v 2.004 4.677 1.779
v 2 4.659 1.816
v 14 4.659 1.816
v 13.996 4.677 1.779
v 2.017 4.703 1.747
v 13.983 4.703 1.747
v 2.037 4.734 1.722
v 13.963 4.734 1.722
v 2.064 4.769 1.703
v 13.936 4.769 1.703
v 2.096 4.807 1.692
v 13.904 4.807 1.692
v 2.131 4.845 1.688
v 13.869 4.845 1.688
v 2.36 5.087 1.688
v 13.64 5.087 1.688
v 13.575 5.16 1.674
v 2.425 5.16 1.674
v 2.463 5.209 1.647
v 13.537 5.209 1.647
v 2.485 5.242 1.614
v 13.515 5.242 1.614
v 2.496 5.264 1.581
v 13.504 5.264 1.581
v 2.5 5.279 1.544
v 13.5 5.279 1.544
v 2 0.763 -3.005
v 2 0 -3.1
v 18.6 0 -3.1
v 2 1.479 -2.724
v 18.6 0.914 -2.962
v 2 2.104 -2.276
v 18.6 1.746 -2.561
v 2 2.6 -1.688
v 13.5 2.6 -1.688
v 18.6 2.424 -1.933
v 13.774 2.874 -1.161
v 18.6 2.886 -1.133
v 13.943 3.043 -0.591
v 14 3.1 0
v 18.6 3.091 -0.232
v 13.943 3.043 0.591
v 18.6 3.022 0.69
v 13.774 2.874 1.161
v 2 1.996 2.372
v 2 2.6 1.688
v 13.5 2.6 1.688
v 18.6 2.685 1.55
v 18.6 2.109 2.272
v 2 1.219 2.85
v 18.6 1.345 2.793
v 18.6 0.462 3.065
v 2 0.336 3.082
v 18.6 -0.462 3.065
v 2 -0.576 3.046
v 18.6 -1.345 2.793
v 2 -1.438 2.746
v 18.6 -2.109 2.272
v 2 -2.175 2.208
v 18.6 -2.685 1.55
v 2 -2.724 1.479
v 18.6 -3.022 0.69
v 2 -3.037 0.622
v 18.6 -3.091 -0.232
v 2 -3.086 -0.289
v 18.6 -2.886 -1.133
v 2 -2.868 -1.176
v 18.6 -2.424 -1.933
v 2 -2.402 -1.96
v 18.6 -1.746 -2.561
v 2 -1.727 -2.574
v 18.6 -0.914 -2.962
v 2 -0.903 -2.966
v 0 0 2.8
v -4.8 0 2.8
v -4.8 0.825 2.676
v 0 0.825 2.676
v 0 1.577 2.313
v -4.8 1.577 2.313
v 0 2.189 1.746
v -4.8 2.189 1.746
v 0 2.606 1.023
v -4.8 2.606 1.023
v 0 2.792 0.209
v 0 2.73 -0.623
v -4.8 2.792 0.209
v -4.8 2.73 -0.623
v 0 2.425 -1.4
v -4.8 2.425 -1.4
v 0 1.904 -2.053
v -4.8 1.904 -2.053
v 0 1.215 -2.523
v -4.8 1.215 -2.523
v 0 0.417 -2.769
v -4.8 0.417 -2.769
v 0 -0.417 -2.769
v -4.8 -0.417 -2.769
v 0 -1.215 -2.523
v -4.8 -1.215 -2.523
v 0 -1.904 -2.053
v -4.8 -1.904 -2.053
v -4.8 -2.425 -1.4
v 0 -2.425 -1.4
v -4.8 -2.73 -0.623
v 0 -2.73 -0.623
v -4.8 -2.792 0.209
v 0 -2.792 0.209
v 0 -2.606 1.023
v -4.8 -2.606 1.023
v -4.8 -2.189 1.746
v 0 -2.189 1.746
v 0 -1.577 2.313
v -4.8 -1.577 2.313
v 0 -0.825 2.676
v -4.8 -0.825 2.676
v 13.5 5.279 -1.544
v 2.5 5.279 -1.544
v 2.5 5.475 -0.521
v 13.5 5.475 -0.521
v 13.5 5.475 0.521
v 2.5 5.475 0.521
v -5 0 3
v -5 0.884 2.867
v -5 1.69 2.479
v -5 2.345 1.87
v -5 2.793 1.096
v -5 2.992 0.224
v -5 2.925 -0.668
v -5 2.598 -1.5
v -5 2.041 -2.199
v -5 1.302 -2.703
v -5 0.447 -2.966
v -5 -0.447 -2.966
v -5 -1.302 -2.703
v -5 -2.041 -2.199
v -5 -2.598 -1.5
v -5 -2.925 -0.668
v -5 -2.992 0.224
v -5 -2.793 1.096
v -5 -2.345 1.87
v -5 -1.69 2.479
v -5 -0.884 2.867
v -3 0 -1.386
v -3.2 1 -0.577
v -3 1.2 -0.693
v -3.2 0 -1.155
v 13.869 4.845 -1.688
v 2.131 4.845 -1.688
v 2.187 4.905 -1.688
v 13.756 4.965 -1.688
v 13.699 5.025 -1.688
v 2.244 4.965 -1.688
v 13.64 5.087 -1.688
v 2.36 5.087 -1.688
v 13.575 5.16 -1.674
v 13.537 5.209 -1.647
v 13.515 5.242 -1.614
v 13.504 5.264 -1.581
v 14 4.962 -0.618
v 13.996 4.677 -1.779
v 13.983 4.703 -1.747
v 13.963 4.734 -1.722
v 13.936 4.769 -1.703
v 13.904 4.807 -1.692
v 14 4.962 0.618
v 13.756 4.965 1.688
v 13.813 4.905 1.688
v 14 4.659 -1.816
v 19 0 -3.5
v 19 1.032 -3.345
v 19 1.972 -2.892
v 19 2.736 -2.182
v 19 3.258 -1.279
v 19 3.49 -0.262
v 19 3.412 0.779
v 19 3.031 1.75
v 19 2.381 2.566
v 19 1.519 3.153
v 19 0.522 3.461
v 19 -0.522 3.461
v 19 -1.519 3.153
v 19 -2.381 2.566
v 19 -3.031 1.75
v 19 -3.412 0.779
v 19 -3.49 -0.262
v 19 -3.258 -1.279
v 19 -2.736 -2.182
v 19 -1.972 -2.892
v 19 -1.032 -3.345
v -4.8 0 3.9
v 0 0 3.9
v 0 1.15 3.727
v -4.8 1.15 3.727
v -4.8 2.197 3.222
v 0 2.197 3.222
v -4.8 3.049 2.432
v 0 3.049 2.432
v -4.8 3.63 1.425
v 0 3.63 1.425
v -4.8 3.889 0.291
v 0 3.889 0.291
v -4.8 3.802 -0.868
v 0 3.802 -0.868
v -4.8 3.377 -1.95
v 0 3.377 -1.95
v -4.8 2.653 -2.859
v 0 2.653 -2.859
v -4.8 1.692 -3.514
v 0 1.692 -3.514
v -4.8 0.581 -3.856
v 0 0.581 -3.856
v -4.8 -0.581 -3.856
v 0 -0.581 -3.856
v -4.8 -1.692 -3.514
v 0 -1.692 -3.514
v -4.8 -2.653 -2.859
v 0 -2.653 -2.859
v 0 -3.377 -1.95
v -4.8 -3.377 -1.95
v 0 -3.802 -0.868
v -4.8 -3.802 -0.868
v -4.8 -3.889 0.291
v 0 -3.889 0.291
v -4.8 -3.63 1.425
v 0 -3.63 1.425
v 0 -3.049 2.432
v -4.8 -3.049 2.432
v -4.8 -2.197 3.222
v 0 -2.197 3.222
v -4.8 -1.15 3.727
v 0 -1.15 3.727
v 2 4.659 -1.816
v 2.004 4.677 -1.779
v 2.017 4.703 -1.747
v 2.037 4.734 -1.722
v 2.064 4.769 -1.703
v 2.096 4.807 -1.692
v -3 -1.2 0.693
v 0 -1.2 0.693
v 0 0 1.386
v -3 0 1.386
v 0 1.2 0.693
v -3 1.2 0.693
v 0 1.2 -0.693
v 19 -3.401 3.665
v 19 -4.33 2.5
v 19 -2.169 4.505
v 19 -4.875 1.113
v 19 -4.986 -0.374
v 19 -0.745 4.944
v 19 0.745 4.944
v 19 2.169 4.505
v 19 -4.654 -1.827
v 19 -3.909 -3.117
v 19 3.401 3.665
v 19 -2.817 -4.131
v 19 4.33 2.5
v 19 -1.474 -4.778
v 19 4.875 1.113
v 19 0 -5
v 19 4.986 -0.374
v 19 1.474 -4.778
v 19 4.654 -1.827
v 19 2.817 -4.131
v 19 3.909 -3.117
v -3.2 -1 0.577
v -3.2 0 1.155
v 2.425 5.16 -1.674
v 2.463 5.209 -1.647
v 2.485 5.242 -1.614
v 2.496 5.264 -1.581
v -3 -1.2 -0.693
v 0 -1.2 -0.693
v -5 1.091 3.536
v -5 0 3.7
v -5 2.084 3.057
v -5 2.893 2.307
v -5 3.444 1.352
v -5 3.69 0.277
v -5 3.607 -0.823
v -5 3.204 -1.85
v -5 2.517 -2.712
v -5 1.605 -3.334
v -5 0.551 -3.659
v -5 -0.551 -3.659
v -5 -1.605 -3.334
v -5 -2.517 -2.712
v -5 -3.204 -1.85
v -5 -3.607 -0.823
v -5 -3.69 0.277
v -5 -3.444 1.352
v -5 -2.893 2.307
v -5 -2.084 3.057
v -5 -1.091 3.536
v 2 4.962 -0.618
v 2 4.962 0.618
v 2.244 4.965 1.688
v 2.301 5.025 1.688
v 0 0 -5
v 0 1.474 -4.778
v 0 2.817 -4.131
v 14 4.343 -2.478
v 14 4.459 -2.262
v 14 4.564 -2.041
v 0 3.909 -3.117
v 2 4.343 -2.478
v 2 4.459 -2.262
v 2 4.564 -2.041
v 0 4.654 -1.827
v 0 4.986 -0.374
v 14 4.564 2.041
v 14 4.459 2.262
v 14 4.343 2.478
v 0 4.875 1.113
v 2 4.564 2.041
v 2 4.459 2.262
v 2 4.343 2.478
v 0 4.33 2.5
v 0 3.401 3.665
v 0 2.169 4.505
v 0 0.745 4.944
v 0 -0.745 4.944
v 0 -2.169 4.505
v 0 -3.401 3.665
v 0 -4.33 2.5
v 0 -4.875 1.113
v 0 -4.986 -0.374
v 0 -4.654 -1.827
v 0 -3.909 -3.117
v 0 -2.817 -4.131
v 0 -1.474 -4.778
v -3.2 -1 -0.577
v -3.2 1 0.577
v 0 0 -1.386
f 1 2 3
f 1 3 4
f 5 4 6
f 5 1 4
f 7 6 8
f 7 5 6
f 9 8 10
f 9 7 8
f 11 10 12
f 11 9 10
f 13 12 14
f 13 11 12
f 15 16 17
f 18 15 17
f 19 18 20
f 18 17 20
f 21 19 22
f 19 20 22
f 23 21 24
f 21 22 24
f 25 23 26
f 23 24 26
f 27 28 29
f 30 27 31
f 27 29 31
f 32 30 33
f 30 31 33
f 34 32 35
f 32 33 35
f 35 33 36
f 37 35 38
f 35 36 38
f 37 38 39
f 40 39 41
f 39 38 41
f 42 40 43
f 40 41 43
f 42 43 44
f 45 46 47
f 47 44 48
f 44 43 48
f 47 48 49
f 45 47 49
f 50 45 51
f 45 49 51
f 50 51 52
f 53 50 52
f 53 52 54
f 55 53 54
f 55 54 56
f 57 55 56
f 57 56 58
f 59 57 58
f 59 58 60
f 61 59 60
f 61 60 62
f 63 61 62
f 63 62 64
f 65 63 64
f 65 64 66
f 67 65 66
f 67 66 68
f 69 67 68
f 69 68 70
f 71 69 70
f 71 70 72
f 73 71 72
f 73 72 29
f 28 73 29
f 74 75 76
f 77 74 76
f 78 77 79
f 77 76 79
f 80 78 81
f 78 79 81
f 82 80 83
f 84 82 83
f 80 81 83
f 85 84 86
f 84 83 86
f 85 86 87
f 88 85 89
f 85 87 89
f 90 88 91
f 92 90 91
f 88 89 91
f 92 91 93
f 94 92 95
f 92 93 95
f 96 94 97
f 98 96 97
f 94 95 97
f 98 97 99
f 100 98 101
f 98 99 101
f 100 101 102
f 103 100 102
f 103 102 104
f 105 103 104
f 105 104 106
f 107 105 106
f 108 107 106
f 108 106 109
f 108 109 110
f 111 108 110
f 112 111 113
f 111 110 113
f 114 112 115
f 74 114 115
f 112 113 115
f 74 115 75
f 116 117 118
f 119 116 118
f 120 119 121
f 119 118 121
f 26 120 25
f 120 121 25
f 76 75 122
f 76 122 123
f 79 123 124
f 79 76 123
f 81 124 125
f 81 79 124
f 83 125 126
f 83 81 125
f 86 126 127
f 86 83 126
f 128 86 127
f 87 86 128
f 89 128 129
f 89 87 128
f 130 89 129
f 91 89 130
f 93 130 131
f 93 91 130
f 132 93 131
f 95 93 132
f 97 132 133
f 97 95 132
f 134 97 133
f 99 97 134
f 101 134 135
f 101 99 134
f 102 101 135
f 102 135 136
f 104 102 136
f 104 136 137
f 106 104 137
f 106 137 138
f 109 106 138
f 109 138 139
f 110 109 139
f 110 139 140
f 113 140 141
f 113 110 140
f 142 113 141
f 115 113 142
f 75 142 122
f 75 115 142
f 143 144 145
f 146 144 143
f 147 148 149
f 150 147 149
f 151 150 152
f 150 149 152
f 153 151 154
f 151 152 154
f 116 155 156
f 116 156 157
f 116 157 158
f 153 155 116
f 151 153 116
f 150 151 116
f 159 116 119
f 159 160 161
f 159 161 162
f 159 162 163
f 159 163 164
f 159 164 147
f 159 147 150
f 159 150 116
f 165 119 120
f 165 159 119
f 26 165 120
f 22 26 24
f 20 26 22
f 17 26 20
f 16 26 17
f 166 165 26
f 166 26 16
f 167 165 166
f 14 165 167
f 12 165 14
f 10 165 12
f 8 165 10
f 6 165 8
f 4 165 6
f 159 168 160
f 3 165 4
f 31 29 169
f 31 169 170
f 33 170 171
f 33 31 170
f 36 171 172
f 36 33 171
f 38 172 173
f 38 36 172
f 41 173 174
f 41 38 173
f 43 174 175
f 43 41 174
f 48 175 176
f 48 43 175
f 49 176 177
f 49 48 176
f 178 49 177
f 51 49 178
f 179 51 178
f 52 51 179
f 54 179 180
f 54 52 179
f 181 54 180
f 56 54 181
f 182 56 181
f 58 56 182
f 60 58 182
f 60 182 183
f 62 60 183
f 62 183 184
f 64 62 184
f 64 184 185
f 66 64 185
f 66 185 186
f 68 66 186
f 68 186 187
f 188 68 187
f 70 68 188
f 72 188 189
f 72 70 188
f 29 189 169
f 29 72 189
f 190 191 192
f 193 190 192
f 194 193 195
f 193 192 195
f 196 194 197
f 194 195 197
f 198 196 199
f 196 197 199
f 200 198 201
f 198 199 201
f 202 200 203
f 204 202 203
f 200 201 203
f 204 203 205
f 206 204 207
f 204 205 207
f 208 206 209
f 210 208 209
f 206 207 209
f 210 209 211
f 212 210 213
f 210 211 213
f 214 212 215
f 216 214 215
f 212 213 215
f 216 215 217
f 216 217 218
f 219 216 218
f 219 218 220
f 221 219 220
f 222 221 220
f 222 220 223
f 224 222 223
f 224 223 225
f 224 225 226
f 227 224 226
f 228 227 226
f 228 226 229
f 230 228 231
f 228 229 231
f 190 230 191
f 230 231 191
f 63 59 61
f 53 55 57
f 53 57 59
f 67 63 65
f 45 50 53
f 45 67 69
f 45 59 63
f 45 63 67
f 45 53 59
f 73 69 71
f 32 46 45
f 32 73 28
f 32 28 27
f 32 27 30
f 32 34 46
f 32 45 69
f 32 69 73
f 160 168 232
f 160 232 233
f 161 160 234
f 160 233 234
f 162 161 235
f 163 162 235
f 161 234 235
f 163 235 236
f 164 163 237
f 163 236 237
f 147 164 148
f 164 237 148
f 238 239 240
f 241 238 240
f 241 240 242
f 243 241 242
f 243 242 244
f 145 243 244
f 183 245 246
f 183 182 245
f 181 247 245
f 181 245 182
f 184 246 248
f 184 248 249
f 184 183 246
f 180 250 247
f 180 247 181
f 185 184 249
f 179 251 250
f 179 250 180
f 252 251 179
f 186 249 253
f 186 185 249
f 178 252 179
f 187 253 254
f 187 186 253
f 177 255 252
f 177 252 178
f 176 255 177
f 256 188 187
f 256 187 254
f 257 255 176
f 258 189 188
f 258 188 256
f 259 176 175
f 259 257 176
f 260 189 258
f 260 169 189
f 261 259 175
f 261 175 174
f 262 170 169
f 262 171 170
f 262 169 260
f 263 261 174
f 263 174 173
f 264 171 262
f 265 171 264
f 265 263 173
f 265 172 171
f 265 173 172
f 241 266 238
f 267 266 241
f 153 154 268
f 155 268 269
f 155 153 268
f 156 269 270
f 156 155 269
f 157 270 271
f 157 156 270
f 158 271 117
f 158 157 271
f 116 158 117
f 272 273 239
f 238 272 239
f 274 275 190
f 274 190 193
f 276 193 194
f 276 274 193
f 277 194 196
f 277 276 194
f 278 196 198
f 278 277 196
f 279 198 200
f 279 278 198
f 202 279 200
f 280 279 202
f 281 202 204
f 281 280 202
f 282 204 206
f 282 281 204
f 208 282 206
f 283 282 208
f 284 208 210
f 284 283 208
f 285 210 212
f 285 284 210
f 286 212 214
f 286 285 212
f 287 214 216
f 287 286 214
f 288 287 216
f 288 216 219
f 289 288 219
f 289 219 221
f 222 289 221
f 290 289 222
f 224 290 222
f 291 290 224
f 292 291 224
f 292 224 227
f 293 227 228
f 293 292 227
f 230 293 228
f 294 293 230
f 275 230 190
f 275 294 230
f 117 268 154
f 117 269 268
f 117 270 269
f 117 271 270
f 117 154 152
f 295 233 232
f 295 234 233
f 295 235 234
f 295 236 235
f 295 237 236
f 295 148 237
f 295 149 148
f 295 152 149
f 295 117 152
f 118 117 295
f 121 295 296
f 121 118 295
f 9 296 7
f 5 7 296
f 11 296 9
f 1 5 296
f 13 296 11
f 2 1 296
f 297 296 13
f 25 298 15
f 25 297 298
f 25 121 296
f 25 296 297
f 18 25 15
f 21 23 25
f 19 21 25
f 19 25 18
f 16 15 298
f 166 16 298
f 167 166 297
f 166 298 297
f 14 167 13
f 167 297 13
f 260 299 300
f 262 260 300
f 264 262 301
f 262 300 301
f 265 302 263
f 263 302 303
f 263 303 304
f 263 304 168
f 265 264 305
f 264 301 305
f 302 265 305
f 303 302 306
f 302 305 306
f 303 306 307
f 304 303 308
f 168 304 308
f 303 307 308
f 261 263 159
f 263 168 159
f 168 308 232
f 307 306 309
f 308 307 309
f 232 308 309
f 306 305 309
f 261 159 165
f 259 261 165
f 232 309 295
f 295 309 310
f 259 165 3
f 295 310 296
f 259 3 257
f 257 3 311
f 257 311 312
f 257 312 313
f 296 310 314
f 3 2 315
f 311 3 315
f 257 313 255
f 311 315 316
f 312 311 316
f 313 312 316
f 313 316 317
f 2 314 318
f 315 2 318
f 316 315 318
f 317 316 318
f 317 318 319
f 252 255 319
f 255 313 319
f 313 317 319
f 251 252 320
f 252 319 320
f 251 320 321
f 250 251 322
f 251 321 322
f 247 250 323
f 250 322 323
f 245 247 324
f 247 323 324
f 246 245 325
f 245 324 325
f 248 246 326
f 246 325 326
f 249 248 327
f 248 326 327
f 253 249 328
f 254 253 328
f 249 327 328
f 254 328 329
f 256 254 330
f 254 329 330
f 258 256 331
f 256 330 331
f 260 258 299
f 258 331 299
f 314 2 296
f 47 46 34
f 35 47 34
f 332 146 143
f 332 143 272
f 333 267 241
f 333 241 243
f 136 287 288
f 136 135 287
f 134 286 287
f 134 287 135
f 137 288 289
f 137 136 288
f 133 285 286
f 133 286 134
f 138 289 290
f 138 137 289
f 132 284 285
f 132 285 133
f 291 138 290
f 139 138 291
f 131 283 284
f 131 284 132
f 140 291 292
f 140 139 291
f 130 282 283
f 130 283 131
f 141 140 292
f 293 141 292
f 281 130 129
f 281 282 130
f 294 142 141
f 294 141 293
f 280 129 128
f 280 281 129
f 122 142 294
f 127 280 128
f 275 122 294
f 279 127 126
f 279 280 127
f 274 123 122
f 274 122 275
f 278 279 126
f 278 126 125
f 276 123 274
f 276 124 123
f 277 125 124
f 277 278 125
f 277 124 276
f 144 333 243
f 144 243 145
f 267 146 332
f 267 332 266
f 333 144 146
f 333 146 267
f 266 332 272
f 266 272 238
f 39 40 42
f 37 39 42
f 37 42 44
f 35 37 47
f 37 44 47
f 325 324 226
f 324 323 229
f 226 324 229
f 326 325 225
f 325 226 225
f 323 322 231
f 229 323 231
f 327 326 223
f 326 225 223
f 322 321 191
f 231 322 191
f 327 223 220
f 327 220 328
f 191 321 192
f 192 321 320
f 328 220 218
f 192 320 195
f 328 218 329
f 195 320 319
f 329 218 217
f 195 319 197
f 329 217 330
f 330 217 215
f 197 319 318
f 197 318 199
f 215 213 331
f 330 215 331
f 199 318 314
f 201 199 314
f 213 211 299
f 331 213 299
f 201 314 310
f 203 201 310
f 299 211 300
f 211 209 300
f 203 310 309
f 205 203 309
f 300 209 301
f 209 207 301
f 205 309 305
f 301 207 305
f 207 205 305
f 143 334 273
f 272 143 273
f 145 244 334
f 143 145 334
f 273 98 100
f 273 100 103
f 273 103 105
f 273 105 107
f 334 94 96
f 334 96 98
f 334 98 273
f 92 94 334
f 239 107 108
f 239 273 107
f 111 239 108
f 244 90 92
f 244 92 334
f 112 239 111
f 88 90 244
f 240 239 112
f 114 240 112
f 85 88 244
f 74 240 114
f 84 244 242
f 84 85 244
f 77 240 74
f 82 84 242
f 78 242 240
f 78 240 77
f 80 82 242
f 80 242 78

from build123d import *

# Parameters (mm, degrees)
SKETCH_1_R          = 5
EXTRUDE_1_DEPTH     = 19
SKETCH_3_R          = 3.1
CUT_EXTRUDE_1_DEPTH = 17
EXTRUDE_2_DEPTH     = 12
SKETCH_8_R          = 3.9
EXTRUDE_4_DEPTH     = 5
SKETCH_9_R          = 2.8
CUT_EXTRUDE_2_DEPTH = 5
EXTRUDE_5_DEPTH     = 3.2
FILLET_1_R          = 0.2
CHAMFER_1_SIZE      = 0.5
CHAMFER_2_SIZE      = 0.4
CHAMFER_3_SIZE      = 0.2


with BuildPart() as part:
    # 草图1 → 凸台-拉伸1 (new body)
    with BuildSketch(Plane(origin=(0, 0, 0), x_dir=(0, 0, -1), z_dir=(1, 0, 0))):
        Circle(SKETCH_1_R)
    extrude(amount=EXTRUDE_1_DEPTH)

    # 草图3 → 切除-拉伸1 (cut)
    with BuildSketch(Plane(origin=(19, 0, 0), x_dir=(0, 0, -1), z_dir=(1, 0, 0))):
        Circle(SKETCH_3_R)
    extrude(amount=-CUT_EXTRUDE_1_DEPTH, mode=Mode.SUBTRACT)

    # 草图5 → 凸台-拉伸2 (add)
    with BuildSketch(Plane(origin=(2, 0, 0), x_dir=(0, 0, -1), z_dir=(1, 0, 0))):
        with BuildLine():
            Line((-1.688194302, 2.6), (1.688194302, 2.6))
            Line((1.688194302, 2.6), (1.688194302, 5.234500931))
            ThreePointArc((1.688194302, 5.234500931), (0, 5.5), (-1.688194302, 5.234500931))
            Line((-1.688194302, 5.234500931), (-1.688194302, 2.6))
        make_face()
    extrude(amount=EXTRUDE_2_DEPTH)

    # 草图8 → 凸台-拉伸4 (add)
    with BuildSketch(Plane.ZY):
        Circle(SKETCH_8_R)
    extrude(amount=EXTRUDE_4_DEPTH)

    # 草图9 → 切除-拉伸2 (cut)
    with BuildSketch(Plane.ZY.offset(5)):
        Circle(SKETCH_9_R)
    extrude(amount=-CUT_EXTRUDE_2_DEPTH, mode=Mode.SUBTRACT)

    # 草图10 → 凸台-拉伸5 (add)
    with BuildSketch(Plane.ZY):
        Polygon((0.692820323, 1.2), (-0.692820323, 1.2), (-1.385640646, 0), (-0.692820323, -1.2), (0.692820323, -1.2), (1.385640646, 0), align=None)
    extrude(amount=EXTRUDE_5_DEPTH)

    # 圆角1
    fillet_1_edges = [part.edges().sort_by_distance(p)[0] for p in [
        (8, 4.70637865, 1.688194302),
        (8, 5.234500931, 1.688194302),
        (8, 4.70637865, -1.688194302),
        (8, 5.234500931, -1.688194302),
    ]]
    fillet(fillet_1_edges, radius=FILLET_1_R)

    # 倒角1
    # the kernel refuses this chamfer: 0.5 mm, written as the material it takes off along each edge
    with BuildSketch(Plane(origin=(14, 0, 0), x_dir=(0, 0.8686030413593419, -0.4955085837211114), z_dir=(0, -0.4955085837211114, -0.8686030413593419))) as chamfer_1_piece_1:
        Polygon((5.5, -CHAMFER_1_SIZE), (5.5 - CHAMFER_1_SIZE, 0), (5.5, 0), align=None)
    revolve(axis=Axis((14, 0, 0), (1, 0, 0)), revolution_arc=59.40658503, mode=Mode.SUBTRACT)
    with BuildSketch(Plane(origin=(2, 0, 0), x_dir=(0, 0.8686030413593415, -0.4955085837211117), z_dir=(0, -0.4955085837211117, -0.8686030413593415))) as chamfer_1_piece_2:
        Polygon((5.5 - CHAMFER_1_SIZE, 0), (5.5, CHAMFER_1_SIZE), (5.5, 0), align=None)
    revolve(axis=Axis((2, 0, 0), (1, 0, 0)), revolution_arc=59.40658503, mode=Mode.SUBTRACT)
    with BuildSketch(Plane(origin=(14, 2.6, 2.974035796), x_dir=(0.027495876610585623, 0.9996219169112968, 0), z_dir=(0, 0, -1))) as chamfer_1_piece_3_section:
        Polygon((CHAMFER_1_SIZE * 0.999621916911, -CHAMFER_1_SIZE * 0.0274958766106), (-CHAMFER_1_SIZE * 0.0274958766106, -CHAMFER_1_SIZE * 0.999621916911), (0, 0), align=None)
    chamfer_1_piece_3 = extrude(amount=5.948071591, mode=Mode.PRIVATE)
    chamfer_1_piece_3 = chamfer_1_piece_3 & Plane(origin=(13.821912141, 0, 0), x_dir=(0, 0, -1), z_dir=(1, 0, 0)) * Cylinder(3.1, 14, mode=Mode.PRIVATE)
    add(chamfer_1_piece_3, mode=Mode.SUBTRACT)

    # 倒角2
    chamfer_2_edges = [part.edges().sort_by_distance(p)[0] for p in [
        (19, 0, 3.1),
    ]]
    chamfer(chamfer_2_edges, length=CHAMFER_2_SIZE)

    # 倒角3
    chamfer_3_edges = [part.edges().sort_by_distance(p)[0] for p in [
        (-5, 0, -3.9),
        (-5, 0, -2.8),
        (-3.2, 0.6, 1.039230485),
        (-3.2, 1.2, 0),
        (-3.2, 0.6, -1.039230485),
        (-3.2, -0.6, -1.039230485),
        (-3.2, -1.2, 0),
        (-3.2, -0.6, 1.039230485),
    ]]
    chamfer(chamfer_3_edges, length=CHAMFER_3_SIZE)


solid = part.part
